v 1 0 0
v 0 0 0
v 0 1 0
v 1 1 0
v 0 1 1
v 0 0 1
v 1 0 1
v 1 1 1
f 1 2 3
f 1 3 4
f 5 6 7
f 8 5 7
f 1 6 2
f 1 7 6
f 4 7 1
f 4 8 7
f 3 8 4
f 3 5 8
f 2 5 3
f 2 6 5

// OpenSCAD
// Unit of length: Unit.INCH
linear_extrude(height = 1.0, center = false, twist = 0.0, scale = 1.0, $fs = 0.01)
{
   square(size = 1.0, center = false);
}
